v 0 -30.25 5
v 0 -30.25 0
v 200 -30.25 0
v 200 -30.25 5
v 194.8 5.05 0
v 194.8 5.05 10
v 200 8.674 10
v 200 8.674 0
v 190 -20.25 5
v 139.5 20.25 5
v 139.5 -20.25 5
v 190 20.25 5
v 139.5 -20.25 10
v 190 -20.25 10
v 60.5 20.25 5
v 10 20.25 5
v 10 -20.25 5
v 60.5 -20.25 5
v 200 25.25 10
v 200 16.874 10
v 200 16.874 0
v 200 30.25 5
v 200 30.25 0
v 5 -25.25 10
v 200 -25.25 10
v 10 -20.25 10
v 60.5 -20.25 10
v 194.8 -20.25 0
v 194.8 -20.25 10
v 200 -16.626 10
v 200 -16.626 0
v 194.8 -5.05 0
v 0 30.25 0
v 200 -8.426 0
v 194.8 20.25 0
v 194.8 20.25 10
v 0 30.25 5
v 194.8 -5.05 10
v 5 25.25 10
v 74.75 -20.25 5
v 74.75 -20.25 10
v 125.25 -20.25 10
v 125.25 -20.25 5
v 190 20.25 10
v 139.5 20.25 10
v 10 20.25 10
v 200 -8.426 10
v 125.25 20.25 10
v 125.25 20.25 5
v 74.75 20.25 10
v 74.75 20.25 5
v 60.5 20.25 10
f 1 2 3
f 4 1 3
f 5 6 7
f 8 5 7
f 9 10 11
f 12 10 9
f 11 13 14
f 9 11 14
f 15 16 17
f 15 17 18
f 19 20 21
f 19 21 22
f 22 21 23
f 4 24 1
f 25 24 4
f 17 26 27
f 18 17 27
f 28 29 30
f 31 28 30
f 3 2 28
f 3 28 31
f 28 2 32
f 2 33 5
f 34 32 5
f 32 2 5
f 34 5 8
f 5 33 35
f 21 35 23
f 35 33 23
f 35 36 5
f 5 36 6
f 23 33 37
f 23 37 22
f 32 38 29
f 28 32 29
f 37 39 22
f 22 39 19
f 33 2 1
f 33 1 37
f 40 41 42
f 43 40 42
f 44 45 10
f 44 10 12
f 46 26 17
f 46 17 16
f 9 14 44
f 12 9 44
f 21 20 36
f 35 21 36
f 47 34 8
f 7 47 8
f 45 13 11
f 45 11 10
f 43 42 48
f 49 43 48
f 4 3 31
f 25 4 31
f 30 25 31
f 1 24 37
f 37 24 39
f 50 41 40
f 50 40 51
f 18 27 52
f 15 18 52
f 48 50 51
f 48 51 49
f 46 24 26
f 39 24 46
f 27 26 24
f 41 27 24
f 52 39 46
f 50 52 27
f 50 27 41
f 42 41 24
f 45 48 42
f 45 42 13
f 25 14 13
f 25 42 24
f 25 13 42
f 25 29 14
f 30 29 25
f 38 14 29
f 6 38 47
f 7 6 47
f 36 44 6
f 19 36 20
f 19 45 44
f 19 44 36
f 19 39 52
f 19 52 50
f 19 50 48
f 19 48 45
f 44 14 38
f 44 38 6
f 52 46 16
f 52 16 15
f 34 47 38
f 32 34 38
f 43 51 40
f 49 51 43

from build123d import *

# Parameters (mm, degrees)
SKIZZE1_W                       = 200
SKIZZE1_H                       = 60.5
AUFSATZ_LINEAR_AUSTRAGEN1_DEPTH = 10
SKIZZE2_W                       = 50.5
SKIZZE2_H                       = 40.5
SCHNITT_LINEAR_AUSTRAGEN1_DEPTH = 5
FASE1_SIZE                      = 5
SCHNITT_LINEAR_AUSTRAGEN2_DEPTH = 10


with BuildPart() as part:
    # Skizze1 → Aufsatz-Linear austragen1 (new body)
    with BuildSketch(Plane.XY):
        with Locations((100, 0)):
            Rectangle(SKIZZE1_W, SKIZZE1_H)
    extrude(amount=AUFSATZ_LINEAR_AUSTRAGEN1_DEPTH)

    # Skizze2 → Schnitt-Linear austragen1 (cut)
    with BuildSketch(Plane.XY.offset(10)):
        with Locations((35.25, 0)):
            Rectangle(SKIZZE2_W, SKIZZE2_H)
        with Locations((100, 0)):
            Rectangle(SKIZZE2_W, SKIZZE2_H)
        with Locations((164.75, 0)):
            Rectangle(SKIZZE2_W, SKIZZE2_H)
    extrude(amount=-SCHNITT_LINEAR_AUSTRAGEN1_DEPTH, mode=Mode.SUBTRACT)

    # Fase1
    fase1_edges = [part.edges().sort_by_distance(p)[0] for p in [
        (100, 30.25, 10),
        (0, 0, 10),
        (100, -30.25, 10),
    ]]
    chamfer(fase1_edges, length=FASE1_SIZE)

    # Skizze4 → Schnitt-Linear austragen2 (cut)
    with BuildSketch(Plane.XY.offset(10)):
        Polygon((200, 16.873625745), (194.8, 20.25), (194.8, 5.05), (200, 8.673625745), align=None)
        Polygon((200, -8.426374255), (194.8, -5.05), (194.8, -20.25), (200, -16.626374255), align=None)
    extrude(amount=-SCHNITT_LINEAR_AUSTRAGEN2_DEPTH, mode=Mode.SUBTRACT)


solid = part.part
